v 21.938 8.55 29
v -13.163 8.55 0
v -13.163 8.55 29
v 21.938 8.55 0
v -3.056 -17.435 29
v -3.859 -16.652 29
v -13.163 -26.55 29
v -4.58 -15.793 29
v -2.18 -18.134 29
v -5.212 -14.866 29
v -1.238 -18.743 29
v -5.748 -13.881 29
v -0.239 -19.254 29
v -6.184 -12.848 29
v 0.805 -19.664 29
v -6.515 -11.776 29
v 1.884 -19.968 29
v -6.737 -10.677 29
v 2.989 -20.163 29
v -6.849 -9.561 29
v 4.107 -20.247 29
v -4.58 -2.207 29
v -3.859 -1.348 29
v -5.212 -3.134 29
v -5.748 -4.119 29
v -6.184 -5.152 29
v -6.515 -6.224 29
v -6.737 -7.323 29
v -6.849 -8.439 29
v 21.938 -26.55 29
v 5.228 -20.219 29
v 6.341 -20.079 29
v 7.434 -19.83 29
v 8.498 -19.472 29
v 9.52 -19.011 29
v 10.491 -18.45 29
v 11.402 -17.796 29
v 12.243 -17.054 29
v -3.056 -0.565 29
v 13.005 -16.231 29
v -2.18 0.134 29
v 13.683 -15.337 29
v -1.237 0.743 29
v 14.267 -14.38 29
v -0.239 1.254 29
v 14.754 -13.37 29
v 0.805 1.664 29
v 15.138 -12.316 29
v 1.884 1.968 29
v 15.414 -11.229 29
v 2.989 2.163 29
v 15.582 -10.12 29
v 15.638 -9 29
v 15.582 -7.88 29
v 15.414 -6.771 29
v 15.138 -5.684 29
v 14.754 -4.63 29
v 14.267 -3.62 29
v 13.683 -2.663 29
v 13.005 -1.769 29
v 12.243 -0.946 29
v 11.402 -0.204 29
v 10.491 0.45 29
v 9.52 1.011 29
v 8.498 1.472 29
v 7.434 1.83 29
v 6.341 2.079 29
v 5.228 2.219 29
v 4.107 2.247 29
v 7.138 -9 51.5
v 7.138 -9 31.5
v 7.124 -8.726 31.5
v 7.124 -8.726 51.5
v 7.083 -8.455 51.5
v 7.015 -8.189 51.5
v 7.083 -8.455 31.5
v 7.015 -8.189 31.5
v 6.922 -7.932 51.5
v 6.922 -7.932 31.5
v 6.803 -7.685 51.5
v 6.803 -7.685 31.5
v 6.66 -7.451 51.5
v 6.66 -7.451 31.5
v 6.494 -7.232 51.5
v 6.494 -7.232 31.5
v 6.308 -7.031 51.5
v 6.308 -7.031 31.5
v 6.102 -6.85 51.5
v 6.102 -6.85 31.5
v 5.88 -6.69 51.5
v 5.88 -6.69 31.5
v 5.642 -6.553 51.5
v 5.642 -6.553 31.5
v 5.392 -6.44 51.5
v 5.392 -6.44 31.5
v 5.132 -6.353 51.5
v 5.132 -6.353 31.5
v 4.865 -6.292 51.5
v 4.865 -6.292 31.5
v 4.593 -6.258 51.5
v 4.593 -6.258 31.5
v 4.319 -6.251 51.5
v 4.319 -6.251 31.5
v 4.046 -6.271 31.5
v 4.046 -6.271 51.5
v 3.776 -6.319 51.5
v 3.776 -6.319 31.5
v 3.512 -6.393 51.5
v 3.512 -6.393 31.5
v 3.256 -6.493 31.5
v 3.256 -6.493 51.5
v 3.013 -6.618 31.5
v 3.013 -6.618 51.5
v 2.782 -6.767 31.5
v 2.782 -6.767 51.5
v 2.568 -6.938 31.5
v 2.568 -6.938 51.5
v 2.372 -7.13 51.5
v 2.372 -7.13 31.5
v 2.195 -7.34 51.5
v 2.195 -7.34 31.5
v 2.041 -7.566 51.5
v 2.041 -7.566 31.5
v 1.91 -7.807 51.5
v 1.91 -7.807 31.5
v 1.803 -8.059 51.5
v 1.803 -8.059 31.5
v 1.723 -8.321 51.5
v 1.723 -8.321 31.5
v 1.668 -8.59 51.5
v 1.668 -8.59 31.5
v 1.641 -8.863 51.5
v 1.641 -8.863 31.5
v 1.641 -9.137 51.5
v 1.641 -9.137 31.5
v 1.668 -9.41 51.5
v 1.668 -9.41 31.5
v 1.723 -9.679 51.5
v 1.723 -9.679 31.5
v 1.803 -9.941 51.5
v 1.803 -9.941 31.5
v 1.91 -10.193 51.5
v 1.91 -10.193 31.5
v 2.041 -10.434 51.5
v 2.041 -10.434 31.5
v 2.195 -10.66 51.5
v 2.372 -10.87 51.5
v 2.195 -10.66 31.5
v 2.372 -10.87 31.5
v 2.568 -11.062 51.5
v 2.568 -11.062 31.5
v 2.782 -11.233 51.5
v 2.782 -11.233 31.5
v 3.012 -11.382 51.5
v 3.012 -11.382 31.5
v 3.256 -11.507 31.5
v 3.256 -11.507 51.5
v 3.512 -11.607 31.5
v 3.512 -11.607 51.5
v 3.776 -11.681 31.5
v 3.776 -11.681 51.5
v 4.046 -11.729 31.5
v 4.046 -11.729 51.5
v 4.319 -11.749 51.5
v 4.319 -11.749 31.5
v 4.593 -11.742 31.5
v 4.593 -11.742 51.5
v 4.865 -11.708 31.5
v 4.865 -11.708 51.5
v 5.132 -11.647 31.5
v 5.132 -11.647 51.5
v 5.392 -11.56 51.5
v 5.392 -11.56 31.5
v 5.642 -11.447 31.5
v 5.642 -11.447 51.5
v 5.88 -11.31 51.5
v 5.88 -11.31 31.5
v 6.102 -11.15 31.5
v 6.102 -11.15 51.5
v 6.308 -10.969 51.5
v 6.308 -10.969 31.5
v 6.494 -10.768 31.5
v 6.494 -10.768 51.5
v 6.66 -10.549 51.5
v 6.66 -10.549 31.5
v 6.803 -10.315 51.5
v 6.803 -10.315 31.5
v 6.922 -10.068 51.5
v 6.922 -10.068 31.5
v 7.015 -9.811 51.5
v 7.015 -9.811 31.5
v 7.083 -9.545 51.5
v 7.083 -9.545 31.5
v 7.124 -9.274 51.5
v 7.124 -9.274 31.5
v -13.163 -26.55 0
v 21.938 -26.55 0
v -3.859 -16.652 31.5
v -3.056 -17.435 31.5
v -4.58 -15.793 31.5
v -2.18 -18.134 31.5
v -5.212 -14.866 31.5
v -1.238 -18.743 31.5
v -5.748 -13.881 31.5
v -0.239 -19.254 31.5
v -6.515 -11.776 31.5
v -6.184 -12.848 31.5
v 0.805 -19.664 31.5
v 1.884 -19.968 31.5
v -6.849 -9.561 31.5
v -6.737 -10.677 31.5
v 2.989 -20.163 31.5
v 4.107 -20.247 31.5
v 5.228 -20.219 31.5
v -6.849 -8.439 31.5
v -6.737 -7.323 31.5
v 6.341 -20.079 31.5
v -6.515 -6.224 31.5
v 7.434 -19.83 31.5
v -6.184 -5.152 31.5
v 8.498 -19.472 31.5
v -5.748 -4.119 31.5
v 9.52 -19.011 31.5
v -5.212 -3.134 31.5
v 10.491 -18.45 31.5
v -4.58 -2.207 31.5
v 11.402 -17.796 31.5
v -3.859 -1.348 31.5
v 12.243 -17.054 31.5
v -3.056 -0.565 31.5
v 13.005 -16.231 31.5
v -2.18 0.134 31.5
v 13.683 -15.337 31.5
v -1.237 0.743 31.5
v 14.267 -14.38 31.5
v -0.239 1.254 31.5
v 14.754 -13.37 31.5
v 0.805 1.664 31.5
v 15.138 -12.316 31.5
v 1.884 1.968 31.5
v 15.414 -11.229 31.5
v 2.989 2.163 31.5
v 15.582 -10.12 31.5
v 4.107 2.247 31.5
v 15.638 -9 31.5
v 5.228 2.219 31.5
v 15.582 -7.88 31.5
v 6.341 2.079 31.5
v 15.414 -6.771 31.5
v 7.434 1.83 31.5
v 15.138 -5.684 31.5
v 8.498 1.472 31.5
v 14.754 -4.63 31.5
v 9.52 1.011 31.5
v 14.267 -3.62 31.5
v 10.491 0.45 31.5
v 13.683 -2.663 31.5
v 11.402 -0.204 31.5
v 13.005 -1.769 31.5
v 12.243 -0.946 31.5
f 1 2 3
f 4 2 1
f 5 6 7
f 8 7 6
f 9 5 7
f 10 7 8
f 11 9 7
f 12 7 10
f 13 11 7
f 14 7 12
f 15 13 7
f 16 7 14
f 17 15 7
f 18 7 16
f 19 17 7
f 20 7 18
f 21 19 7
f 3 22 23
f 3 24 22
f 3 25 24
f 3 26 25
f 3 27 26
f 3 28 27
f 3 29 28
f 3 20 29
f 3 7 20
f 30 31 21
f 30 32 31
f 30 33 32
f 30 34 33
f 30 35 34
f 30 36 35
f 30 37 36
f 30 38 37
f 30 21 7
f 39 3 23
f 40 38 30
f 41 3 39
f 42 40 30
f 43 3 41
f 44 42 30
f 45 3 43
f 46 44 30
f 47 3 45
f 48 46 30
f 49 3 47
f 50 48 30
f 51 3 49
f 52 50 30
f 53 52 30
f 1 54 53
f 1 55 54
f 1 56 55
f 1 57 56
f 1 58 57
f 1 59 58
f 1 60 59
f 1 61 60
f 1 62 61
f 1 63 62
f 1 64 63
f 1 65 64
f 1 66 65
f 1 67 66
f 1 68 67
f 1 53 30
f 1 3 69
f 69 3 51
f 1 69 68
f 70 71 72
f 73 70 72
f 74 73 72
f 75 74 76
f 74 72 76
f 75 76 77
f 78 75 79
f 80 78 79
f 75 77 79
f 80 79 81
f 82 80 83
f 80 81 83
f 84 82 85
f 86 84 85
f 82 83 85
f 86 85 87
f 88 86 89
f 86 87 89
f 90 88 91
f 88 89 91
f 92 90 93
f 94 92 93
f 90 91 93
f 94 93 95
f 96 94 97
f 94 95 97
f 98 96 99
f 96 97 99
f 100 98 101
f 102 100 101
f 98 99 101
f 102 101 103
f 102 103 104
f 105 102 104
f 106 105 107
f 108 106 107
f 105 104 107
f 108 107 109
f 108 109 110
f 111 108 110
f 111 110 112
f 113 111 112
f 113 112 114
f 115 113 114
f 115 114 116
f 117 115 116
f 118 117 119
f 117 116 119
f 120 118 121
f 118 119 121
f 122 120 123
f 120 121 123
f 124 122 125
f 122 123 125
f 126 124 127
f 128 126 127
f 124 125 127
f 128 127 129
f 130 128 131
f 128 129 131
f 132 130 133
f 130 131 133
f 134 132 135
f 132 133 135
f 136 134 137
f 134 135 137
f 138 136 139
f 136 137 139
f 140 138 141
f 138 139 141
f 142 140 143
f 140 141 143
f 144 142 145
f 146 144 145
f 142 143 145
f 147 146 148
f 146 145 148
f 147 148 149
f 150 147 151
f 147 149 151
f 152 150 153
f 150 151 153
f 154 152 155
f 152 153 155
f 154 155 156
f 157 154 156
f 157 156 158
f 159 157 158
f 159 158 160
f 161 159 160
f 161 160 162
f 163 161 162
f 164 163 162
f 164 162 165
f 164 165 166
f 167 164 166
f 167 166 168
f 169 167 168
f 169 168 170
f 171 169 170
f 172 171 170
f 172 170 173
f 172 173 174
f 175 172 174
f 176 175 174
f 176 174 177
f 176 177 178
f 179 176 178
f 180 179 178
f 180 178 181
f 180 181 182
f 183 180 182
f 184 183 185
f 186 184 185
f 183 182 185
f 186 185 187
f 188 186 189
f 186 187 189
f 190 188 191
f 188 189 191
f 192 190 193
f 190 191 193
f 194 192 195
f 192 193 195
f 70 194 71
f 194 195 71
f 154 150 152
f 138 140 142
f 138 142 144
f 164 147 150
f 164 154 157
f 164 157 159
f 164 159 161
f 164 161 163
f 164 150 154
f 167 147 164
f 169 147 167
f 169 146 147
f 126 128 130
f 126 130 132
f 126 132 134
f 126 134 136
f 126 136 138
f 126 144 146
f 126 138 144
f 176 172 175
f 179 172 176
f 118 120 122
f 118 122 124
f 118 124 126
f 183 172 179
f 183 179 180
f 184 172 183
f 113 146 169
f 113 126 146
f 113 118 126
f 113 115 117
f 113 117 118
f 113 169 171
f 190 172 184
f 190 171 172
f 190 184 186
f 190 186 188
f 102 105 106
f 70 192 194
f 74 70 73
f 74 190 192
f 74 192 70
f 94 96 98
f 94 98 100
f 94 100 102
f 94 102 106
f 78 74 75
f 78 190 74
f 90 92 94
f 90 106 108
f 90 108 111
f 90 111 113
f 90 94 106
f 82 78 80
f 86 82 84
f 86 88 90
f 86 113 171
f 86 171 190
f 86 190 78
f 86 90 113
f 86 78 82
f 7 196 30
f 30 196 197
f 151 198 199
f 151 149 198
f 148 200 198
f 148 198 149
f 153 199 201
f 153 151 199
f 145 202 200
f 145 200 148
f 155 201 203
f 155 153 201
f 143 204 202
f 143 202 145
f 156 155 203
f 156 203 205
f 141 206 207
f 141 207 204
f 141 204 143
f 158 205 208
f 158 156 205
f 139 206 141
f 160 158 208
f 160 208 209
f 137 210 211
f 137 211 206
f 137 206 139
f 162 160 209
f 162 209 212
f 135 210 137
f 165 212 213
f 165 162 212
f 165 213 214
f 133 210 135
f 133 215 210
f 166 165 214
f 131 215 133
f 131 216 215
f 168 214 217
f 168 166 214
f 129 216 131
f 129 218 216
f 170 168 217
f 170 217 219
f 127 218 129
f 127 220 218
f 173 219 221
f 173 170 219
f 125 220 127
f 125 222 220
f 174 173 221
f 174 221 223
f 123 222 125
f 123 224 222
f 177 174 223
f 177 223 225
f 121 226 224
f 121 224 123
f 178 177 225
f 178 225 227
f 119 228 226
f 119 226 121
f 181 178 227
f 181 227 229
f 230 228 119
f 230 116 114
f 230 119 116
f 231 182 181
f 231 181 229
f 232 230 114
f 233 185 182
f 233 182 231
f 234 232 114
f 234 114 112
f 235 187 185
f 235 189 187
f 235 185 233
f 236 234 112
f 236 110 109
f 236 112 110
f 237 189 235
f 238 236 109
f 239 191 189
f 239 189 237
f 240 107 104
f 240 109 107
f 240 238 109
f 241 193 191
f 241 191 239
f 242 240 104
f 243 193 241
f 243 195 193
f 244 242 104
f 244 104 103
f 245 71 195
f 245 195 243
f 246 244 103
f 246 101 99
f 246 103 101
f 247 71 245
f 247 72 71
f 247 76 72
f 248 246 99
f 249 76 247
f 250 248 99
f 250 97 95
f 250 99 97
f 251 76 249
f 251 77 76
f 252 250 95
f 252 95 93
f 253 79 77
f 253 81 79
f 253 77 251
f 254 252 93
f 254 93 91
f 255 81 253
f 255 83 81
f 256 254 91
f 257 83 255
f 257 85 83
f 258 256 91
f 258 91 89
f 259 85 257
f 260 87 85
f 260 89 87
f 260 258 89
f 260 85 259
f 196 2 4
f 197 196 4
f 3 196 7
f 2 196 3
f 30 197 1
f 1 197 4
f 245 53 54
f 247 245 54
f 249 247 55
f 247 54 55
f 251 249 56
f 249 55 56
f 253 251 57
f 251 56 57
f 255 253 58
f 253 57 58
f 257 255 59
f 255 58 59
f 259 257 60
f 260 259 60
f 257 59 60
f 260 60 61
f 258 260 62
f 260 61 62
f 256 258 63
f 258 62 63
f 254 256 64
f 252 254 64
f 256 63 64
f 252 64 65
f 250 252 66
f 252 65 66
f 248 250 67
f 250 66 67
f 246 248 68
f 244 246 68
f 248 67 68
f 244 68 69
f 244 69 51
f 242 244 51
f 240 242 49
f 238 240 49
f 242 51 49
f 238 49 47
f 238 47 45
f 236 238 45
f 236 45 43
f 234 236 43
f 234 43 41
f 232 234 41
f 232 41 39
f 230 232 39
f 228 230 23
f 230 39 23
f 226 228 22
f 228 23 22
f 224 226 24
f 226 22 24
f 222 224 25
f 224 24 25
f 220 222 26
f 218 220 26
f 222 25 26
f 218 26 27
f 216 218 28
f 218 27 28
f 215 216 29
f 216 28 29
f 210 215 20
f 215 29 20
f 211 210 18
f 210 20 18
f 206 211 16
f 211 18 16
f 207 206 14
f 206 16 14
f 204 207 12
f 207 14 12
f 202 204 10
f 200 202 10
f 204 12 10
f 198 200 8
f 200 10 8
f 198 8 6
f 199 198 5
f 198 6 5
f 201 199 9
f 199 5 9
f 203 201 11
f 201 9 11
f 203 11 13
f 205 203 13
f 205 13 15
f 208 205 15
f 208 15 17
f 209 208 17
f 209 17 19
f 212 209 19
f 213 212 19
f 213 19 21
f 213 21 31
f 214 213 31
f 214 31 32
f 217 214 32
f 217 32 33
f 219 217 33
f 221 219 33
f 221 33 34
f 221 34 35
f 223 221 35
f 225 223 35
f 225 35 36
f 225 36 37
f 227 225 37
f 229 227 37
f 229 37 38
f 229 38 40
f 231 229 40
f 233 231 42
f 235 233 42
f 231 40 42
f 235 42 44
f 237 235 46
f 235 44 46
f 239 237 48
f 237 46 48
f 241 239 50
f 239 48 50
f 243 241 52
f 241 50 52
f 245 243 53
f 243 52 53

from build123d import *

# Parameters (mm, degrees)
SKETCH1_W           = 35.1
SKETCH1_H           = 35.1
BOSS_EXTRUDE1_DEPTH = 29
SKETCH2_R           = 11.25
BOSS_EXTRUDE2_DEPTH = 2.5
SKETCH3_R           = 2.75
BOSS_EXTRUDE3_DEPTH = 20


with BuildPart() as part:
    # Sketch1 → Boss-Extrude1 (new body)
    with BuildSketch(Plane.XY):
        with Locations((4.3875, -9)):
            Rectangle(SKETCH1_W, SKETCH1_H)
    extrude(amount=BOSS_EXTRUDE1_DEPTH)

    # Sketch2 → Boss-Extrude2 (add)
    with BuildSketch(Plane.XY.offset(29)):
        with Locations((4.3875, -9)):
            Circle(SKETCH2_R)
    extrude(amount=BOSS_EXTRUDE2_DEPTH)

    # Sketch3 → Boss-Extrude3 (add)
    with BuildSketch(Plane.XY.offset(31.5)):
        with Locations((4.3875, -9)):
            Circle(SKETCH3_R)
    extrude(amount=BOSS_EXTRUDE3_DEPTH)


solid = part.part
